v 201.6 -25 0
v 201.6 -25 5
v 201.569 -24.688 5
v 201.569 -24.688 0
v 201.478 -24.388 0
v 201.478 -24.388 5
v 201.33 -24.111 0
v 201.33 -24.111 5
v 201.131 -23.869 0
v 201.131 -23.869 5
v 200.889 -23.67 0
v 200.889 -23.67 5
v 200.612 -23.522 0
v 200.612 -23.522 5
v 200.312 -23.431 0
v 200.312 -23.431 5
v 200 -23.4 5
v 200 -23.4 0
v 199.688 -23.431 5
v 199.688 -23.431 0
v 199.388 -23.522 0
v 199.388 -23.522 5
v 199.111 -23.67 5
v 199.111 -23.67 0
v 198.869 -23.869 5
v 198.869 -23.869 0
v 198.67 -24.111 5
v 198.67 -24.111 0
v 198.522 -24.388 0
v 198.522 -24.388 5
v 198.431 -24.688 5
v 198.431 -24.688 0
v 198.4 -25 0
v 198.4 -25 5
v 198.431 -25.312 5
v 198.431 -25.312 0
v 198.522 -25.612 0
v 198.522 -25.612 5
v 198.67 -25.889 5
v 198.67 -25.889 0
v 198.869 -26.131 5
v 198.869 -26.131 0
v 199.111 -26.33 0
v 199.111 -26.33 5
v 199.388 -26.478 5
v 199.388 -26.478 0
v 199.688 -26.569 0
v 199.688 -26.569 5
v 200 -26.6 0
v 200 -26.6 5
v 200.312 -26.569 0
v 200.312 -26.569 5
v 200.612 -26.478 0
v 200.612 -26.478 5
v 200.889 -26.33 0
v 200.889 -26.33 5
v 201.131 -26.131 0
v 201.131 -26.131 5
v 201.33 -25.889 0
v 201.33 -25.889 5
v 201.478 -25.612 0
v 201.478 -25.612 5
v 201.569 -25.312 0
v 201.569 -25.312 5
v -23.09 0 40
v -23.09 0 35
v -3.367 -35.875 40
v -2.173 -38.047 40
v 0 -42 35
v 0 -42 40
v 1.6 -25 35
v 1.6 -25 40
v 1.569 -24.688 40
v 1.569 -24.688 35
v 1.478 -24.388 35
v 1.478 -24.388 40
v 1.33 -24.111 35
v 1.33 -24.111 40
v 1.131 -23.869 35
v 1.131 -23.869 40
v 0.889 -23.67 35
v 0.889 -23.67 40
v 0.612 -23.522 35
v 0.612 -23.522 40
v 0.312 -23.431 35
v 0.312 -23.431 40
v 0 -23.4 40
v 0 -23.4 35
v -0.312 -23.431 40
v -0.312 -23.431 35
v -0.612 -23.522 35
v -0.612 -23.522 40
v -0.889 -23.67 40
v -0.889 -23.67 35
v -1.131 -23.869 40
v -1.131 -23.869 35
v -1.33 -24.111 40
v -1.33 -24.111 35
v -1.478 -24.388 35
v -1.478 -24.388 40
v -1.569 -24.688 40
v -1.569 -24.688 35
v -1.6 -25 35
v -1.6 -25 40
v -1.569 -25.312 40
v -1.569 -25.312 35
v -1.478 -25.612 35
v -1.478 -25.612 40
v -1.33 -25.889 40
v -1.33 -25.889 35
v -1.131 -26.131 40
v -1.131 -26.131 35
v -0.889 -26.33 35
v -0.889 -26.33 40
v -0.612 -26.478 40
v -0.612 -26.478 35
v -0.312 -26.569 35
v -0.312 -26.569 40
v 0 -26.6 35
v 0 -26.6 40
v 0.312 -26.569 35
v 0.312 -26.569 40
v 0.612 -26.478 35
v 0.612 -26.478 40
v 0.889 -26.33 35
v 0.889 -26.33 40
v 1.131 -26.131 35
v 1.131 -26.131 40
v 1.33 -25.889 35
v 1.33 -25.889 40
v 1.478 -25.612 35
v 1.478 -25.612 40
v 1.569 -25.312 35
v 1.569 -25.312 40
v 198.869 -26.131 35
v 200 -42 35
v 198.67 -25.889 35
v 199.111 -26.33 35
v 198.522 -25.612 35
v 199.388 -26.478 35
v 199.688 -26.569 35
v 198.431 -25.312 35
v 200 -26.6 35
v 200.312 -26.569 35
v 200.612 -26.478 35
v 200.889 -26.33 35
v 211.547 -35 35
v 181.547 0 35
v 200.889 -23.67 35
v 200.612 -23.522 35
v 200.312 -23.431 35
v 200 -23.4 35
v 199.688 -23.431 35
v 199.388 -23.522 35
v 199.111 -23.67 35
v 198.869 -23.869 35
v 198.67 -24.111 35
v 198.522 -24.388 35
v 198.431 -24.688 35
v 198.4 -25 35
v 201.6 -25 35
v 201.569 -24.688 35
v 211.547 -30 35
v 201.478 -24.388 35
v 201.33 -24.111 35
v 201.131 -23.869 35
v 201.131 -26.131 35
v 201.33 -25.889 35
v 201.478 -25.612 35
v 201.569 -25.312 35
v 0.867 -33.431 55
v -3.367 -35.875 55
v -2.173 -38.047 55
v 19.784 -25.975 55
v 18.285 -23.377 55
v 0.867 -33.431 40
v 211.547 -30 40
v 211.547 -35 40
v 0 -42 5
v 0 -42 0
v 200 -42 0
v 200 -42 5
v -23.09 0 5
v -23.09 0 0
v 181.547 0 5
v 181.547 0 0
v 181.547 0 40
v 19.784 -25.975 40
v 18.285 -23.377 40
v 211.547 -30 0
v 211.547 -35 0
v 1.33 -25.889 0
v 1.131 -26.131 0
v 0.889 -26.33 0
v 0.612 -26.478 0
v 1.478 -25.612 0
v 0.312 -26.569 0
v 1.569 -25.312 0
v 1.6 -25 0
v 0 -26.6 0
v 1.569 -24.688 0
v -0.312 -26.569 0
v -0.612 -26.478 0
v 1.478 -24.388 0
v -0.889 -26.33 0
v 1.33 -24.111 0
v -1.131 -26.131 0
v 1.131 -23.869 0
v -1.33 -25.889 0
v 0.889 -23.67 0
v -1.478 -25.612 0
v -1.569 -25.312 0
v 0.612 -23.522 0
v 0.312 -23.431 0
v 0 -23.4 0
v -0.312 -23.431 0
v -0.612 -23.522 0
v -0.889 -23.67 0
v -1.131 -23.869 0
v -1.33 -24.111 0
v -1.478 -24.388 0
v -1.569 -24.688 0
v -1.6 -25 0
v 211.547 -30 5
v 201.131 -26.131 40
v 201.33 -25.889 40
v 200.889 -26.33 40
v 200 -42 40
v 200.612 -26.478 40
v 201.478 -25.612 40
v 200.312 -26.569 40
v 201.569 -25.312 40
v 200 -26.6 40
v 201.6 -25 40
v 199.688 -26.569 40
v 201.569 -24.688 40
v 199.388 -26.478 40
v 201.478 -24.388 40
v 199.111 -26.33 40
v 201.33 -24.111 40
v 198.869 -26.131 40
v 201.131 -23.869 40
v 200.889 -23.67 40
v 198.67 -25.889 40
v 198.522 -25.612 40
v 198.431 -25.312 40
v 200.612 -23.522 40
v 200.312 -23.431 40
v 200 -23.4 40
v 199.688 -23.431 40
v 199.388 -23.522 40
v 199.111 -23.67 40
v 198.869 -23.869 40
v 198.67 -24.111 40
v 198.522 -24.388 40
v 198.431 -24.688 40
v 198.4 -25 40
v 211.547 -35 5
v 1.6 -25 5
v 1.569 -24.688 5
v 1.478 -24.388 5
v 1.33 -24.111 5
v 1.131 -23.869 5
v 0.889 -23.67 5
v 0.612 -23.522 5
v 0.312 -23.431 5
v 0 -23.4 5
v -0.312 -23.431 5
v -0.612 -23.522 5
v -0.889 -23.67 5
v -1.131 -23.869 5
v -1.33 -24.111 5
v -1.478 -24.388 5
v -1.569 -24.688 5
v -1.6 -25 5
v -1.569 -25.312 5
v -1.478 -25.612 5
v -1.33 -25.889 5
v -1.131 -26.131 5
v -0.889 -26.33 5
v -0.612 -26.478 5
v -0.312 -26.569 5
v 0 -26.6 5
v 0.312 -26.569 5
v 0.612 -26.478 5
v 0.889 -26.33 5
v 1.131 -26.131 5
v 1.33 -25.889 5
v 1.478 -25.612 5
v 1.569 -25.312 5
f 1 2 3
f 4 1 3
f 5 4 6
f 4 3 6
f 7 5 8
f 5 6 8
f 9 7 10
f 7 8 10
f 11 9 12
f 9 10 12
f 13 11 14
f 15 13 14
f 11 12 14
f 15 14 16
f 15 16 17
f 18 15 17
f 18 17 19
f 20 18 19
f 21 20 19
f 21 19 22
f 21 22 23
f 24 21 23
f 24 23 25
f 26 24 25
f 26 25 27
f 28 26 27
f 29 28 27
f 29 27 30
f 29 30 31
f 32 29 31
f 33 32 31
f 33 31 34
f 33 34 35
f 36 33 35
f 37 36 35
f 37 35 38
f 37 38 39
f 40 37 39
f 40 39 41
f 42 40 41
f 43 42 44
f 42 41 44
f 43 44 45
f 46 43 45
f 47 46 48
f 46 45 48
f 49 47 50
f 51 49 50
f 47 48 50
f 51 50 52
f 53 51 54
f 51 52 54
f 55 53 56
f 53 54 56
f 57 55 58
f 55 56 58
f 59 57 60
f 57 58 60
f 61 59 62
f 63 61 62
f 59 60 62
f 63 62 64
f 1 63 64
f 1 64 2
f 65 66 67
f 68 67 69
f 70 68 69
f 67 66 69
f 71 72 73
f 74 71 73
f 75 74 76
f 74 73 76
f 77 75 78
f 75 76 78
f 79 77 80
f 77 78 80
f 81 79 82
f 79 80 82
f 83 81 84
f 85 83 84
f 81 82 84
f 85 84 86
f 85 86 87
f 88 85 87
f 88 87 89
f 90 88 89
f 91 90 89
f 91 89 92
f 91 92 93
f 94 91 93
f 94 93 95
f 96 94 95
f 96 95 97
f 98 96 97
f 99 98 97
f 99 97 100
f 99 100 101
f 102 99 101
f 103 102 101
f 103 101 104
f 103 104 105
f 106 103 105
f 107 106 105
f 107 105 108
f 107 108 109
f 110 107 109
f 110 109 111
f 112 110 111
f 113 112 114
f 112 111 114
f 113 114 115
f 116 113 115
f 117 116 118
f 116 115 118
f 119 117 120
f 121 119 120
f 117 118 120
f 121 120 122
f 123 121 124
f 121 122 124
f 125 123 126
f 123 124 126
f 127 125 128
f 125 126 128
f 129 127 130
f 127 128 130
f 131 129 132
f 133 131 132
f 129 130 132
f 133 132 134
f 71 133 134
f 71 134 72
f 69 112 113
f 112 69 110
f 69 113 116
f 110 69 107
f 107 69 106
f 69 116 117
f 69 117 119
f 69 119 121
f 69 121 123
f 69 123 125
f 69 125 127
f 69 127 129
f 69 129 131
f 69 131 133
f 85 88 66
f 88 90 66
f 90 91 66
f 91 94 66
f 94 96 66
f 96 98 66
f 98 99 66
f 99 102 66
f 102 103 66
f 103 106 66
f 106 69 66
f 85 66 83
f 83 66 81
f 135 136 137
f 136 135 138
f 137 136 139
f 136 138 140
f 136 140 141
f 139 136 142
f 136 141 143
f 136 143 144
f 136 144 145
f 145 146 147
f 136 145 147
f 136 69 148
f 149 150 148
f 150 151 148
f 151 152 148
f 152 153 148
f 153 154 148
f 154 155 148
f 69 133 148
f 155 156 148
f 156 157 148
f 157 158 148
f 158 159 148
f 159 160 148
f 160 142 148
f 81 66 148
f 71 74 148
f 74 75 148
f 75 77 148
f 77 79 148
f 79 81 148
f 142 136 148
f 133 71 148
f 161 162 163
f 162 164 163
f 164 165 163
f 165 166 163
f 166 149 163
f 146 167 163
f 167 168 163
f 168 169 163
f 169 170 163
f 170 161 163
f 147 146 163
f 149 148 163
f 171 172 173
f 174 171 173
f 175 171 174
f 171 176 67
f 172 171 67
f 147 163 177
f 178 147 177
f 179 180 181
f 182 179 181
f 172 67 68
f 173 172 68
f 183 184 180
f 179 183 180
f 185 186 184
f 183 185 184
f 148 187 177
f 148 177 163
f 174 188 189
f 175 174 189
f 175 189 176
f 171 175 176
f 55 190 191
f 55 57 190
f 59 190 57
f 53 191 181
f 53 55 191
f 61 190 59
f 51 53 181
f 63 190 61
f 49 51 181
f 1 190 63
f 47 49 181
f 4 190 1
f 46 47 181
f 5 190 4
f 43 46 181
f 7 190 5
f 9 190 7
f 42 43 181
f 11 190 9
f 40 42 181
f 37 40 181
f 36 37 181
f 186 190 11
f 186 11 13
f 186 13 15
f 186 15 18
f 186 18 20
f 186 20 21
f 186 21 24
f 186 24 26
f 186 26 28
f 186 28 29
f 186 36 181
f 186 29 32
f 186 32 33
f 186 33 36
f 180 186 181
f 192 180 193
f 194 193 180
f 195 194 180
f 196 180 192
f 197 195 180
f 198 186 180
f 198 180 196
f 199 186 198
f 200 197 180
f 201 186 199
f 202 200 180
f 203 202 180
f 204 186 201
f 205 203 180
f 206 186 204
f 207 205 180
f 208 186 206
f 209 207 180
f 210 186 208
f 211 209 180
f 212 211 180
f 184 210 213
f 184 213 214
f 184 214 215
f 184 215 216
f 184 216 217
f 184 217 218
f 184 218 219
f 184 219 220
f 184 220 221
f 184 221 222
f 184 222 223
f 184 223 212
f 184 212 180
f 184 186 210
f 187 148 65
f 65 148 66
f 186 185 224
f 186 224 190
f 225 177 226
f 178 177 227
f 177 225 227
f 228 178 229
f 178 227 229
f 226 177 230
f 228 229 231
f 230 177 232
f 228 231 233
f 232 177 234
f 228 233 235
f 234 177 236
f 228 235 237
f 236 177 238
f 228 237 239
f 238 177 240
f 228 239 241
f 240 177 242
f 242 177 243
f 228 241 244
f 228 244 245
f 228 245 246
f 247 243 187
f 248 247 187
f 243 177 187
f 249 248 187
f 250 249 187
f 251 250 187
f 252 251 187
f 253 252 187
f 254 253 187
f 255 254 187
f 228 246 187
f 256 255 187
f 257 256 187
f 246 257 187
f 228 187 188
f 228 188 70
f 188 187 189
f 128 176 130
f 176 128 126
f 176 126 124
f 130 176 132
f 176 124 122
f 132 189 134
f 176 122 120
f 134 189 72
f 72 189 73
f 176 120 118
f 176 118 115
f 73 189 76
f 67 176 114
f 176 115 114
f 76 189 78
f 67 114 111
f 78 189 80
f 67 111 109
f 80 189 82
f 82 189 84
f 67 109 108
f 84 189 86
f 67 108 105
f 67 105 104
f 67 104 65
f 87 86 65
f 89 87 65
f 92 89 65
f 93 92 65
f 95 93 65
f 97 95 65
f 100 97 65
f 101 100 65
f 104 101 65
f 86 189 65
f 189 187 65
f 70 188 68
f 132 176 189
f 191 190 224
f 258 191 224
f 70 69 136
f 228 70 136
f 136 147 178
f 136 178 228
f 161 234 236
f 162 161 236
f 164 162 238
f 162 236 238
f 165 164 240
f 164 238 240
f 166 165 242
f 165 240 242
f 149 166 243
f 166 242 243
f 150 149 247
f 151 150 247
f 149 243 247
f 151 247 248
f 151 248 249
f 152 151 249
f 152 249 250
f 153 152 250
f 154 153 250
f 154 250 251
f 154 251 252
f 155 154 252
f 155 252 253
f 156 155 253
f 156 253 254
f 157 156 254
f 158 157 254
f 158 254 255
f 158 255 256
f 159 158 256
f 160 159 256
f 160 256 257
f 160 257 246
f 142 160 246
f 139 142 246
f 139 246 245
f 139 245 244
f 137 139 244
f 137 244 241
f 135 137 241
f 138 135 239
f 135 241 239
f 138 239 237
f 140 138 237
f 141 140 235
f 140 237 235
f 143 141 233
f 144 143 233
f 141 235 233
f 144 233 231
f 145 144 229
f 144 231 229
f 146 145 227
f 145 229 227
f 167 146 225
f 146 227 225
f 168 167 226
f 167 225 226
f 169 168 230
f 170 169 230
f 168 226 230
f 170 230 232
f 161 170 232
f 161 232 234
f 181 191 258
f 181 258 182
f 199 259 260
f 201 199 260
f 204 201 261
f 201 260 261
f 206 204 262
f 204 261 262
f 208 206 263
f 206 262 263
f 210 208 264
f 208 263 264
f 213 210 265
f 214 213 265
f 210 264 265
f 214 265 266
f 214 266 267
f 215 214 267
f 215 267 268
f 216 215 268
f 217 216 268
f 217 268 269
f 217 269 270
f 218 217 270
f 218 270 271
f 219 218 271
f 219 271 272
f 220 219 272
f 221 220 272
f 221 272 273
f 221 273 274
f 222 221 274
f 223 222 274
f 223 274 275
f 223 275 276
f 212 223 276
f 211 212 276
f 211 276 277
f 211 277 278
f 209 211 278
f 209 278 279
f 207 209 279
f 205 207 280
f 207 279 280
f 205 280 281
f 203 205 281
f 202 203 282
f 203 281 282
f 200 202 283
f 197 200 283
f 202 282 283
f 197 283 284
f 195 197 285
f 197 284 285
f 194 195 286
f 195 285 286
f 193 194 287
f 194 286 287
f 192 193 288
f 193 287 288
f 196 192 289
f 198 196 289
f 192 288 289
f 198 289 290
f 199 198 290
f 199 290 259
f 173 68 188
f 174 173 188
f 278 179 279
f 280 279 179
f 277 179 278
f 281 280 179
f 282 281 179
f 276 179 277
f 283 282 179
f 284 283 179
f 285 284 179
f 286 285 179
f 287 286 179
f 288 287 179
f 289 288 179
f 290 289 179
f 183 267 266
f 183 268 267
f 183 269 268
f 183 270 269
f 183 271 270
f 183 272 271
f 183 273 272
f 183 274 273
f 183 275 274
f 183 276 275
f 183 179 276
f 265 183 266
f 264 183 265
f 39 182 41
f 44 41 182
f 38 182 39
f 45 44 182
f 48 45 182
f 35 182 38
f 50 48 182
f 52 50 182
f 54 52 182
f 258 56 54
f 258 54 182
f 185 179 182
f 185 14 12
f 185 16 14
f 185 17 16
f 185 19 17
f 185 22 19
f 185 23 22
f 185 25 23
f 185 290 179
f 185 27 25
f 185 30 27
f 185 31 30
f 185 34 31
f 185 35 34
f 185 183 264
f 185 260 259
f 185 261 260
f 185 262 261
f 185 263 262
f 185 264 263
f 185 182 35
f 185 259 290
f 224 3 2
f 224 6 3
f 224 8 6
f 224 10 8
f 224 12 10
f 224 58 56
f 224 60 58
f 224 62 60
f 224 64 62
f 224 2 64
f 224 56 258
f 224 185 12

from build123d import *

# Parameters (mm, degrees)
SKETCH1_W           = 200
SKETCH1_H           = 42
BOSS_EXTRUDE1_DEPTH = 40
SKETCH7_W           = 292.37
SKETCH7_H           = 30
CUT_EXTRUDE1_DEPTH  = 35
SKETCH11_R          = 1.6
CUT_EXTRUDE2_DEPTH  = 60
BOSS_EXTRUDE3_DEPTH = 15
CUT_EXTRUDE3_DEPTH  = 50
CUT_EXTRUDE4_REACH  = 223.364
SKETCH16_W          = 215.395
SKETCH16_H          = 30
CHAMFER1_SIZE       = 30
CHAMFER2_SIZE       = 30


with BuildPart() as part:
    # Sketch1 → Boss-Extrude1 (new body)
    with BuildSketch(Plane.XY):
        Polygon((269.28, 0), (200, -42), (200, 0), align=None)
        with Locations((100, -21)):
            Rectangle(SKETCH1_W, SKETCH1_H)
        Polygon((0, 0), (-23.09, 0), (0, -42), align=None)
    extrude(amount=BOSS_EXTRUDE1_DEPTH)

    # Sketch7 → Cut-Extrude1 (cut)
    with BuildSketch(Plane(origin=(0, 0, 0), x_dir=(1, 0, 0), z_dir=(0, 1, 0))):
        with Locations((123.095, -20)):
            Rectangle(SKETCH7_W, SKETCH7_H)
    extrude(amount=-CUT_EXTRUDE1_DEPTH, mode=Mode.SUBTRACT)

    # Sketch11 → Cut-Extrude2 (cut)
    with BuildSketch(Plane.XY.offset(40)):
        with Locations((0, -25)):
            Circle(SKETCH11_R)
        with Locations((200, -25)):
            Circle(SKETCH11_R)
    extrude(amount=-CUT_EXTRUDE2_DEPTH, mode=Mode.SUBTRACT)

    # Sketch12 → Boss-Extrude3 (add)
    with BuildSketch(Plane.XY.offset(40)):
        Polygon((-3.367072415, -35.875398811), (-2.1733684, -38.046709709), (19.784307289, -25.975216098), (18.284502682, -23.377027086), (0.866710605, -33.431447562), align=None)
    extrude(amount=BOSS_EXTRUDE3_DEPTH)

    # Sketch15 → Cut-Extrude3 (cut, symmetric)
    with BuildSketch(Plane(origin=(0, -35, 0), x_dir=(1, 0, 0), z_dir=(0, 1, 0))):
        Polygon((211.546666667, -5), (211.546666667, 0), (269.28, 0), (269.28, -40), (211.546666667, -40), (211.546666667, -35), align=None)
    extrude(amount=CUT_EXTRUDE3_DEPTH, both=True, mode=Mode.SUBTRACT)

    # Sketch16 → Cut-Extrude4 (cut, up to next)
    with BuildSketch(Plane(origin=(0, -35, 0), x_dir=(1, 0, 0), z_dir=(0, 1, 0)), mode=Mode.PRIVATE) as cut_extrude4_sk1:
        with Locations((103.849166667, -20)):
            Rectangle(SKETCH16_W, SKETCH16_H)
    cut_extrude4_tool1 = extrude(cut_extrude4_sk1.sketch, amount=-CUT_EXTRUDE4_REACH, mode=Mode.PRIVATE) & part.part
    add(cut_extrude4_tool1.solids().sort_by_distance((103.849167, -35, 20))[0], mode=Mode.SUBTRACT)


with BuildPart() as cut_extrude4_piece_1:
    # of the separate pieces the step leaves, piece 1, a body of its own (cut_extrude4_pieces)
    add(part.part.solids().sort_by_distance((211.546666667, -35, 35))[0])

    # Chamfer1
    chamfer1_edges = [cut_extrude4_piece_1.edges().sort_by_distance(p)[0] for p in [
        (211.546666667, 0, 37.5),
    ]]
    chamfer(chamfer1_edges, length=CHAMFER1_SIZE)


with BuildPart() as cut_extrude4_piece_2:
    # of the separate pieces the step leaves, piece 2, a body of its own (cut_extrude4_pieces)
    add(part.part.solids().sort_by_distance((211.546666667, -35, 0))[0])

    # Chamfer2
    chamfer2_edges = [cut_extrude4_piece_2.edges().sort_by_distance(p)[0] for p in [
        (211.546666667, 0, 2.5),
    ]]
    chamfer(chamfer2_edges, length=CHAMFER2_SIZE)


solid = Compound([cut_extrude4_piece_1.part, cut_extrude4_piece_2.part])
